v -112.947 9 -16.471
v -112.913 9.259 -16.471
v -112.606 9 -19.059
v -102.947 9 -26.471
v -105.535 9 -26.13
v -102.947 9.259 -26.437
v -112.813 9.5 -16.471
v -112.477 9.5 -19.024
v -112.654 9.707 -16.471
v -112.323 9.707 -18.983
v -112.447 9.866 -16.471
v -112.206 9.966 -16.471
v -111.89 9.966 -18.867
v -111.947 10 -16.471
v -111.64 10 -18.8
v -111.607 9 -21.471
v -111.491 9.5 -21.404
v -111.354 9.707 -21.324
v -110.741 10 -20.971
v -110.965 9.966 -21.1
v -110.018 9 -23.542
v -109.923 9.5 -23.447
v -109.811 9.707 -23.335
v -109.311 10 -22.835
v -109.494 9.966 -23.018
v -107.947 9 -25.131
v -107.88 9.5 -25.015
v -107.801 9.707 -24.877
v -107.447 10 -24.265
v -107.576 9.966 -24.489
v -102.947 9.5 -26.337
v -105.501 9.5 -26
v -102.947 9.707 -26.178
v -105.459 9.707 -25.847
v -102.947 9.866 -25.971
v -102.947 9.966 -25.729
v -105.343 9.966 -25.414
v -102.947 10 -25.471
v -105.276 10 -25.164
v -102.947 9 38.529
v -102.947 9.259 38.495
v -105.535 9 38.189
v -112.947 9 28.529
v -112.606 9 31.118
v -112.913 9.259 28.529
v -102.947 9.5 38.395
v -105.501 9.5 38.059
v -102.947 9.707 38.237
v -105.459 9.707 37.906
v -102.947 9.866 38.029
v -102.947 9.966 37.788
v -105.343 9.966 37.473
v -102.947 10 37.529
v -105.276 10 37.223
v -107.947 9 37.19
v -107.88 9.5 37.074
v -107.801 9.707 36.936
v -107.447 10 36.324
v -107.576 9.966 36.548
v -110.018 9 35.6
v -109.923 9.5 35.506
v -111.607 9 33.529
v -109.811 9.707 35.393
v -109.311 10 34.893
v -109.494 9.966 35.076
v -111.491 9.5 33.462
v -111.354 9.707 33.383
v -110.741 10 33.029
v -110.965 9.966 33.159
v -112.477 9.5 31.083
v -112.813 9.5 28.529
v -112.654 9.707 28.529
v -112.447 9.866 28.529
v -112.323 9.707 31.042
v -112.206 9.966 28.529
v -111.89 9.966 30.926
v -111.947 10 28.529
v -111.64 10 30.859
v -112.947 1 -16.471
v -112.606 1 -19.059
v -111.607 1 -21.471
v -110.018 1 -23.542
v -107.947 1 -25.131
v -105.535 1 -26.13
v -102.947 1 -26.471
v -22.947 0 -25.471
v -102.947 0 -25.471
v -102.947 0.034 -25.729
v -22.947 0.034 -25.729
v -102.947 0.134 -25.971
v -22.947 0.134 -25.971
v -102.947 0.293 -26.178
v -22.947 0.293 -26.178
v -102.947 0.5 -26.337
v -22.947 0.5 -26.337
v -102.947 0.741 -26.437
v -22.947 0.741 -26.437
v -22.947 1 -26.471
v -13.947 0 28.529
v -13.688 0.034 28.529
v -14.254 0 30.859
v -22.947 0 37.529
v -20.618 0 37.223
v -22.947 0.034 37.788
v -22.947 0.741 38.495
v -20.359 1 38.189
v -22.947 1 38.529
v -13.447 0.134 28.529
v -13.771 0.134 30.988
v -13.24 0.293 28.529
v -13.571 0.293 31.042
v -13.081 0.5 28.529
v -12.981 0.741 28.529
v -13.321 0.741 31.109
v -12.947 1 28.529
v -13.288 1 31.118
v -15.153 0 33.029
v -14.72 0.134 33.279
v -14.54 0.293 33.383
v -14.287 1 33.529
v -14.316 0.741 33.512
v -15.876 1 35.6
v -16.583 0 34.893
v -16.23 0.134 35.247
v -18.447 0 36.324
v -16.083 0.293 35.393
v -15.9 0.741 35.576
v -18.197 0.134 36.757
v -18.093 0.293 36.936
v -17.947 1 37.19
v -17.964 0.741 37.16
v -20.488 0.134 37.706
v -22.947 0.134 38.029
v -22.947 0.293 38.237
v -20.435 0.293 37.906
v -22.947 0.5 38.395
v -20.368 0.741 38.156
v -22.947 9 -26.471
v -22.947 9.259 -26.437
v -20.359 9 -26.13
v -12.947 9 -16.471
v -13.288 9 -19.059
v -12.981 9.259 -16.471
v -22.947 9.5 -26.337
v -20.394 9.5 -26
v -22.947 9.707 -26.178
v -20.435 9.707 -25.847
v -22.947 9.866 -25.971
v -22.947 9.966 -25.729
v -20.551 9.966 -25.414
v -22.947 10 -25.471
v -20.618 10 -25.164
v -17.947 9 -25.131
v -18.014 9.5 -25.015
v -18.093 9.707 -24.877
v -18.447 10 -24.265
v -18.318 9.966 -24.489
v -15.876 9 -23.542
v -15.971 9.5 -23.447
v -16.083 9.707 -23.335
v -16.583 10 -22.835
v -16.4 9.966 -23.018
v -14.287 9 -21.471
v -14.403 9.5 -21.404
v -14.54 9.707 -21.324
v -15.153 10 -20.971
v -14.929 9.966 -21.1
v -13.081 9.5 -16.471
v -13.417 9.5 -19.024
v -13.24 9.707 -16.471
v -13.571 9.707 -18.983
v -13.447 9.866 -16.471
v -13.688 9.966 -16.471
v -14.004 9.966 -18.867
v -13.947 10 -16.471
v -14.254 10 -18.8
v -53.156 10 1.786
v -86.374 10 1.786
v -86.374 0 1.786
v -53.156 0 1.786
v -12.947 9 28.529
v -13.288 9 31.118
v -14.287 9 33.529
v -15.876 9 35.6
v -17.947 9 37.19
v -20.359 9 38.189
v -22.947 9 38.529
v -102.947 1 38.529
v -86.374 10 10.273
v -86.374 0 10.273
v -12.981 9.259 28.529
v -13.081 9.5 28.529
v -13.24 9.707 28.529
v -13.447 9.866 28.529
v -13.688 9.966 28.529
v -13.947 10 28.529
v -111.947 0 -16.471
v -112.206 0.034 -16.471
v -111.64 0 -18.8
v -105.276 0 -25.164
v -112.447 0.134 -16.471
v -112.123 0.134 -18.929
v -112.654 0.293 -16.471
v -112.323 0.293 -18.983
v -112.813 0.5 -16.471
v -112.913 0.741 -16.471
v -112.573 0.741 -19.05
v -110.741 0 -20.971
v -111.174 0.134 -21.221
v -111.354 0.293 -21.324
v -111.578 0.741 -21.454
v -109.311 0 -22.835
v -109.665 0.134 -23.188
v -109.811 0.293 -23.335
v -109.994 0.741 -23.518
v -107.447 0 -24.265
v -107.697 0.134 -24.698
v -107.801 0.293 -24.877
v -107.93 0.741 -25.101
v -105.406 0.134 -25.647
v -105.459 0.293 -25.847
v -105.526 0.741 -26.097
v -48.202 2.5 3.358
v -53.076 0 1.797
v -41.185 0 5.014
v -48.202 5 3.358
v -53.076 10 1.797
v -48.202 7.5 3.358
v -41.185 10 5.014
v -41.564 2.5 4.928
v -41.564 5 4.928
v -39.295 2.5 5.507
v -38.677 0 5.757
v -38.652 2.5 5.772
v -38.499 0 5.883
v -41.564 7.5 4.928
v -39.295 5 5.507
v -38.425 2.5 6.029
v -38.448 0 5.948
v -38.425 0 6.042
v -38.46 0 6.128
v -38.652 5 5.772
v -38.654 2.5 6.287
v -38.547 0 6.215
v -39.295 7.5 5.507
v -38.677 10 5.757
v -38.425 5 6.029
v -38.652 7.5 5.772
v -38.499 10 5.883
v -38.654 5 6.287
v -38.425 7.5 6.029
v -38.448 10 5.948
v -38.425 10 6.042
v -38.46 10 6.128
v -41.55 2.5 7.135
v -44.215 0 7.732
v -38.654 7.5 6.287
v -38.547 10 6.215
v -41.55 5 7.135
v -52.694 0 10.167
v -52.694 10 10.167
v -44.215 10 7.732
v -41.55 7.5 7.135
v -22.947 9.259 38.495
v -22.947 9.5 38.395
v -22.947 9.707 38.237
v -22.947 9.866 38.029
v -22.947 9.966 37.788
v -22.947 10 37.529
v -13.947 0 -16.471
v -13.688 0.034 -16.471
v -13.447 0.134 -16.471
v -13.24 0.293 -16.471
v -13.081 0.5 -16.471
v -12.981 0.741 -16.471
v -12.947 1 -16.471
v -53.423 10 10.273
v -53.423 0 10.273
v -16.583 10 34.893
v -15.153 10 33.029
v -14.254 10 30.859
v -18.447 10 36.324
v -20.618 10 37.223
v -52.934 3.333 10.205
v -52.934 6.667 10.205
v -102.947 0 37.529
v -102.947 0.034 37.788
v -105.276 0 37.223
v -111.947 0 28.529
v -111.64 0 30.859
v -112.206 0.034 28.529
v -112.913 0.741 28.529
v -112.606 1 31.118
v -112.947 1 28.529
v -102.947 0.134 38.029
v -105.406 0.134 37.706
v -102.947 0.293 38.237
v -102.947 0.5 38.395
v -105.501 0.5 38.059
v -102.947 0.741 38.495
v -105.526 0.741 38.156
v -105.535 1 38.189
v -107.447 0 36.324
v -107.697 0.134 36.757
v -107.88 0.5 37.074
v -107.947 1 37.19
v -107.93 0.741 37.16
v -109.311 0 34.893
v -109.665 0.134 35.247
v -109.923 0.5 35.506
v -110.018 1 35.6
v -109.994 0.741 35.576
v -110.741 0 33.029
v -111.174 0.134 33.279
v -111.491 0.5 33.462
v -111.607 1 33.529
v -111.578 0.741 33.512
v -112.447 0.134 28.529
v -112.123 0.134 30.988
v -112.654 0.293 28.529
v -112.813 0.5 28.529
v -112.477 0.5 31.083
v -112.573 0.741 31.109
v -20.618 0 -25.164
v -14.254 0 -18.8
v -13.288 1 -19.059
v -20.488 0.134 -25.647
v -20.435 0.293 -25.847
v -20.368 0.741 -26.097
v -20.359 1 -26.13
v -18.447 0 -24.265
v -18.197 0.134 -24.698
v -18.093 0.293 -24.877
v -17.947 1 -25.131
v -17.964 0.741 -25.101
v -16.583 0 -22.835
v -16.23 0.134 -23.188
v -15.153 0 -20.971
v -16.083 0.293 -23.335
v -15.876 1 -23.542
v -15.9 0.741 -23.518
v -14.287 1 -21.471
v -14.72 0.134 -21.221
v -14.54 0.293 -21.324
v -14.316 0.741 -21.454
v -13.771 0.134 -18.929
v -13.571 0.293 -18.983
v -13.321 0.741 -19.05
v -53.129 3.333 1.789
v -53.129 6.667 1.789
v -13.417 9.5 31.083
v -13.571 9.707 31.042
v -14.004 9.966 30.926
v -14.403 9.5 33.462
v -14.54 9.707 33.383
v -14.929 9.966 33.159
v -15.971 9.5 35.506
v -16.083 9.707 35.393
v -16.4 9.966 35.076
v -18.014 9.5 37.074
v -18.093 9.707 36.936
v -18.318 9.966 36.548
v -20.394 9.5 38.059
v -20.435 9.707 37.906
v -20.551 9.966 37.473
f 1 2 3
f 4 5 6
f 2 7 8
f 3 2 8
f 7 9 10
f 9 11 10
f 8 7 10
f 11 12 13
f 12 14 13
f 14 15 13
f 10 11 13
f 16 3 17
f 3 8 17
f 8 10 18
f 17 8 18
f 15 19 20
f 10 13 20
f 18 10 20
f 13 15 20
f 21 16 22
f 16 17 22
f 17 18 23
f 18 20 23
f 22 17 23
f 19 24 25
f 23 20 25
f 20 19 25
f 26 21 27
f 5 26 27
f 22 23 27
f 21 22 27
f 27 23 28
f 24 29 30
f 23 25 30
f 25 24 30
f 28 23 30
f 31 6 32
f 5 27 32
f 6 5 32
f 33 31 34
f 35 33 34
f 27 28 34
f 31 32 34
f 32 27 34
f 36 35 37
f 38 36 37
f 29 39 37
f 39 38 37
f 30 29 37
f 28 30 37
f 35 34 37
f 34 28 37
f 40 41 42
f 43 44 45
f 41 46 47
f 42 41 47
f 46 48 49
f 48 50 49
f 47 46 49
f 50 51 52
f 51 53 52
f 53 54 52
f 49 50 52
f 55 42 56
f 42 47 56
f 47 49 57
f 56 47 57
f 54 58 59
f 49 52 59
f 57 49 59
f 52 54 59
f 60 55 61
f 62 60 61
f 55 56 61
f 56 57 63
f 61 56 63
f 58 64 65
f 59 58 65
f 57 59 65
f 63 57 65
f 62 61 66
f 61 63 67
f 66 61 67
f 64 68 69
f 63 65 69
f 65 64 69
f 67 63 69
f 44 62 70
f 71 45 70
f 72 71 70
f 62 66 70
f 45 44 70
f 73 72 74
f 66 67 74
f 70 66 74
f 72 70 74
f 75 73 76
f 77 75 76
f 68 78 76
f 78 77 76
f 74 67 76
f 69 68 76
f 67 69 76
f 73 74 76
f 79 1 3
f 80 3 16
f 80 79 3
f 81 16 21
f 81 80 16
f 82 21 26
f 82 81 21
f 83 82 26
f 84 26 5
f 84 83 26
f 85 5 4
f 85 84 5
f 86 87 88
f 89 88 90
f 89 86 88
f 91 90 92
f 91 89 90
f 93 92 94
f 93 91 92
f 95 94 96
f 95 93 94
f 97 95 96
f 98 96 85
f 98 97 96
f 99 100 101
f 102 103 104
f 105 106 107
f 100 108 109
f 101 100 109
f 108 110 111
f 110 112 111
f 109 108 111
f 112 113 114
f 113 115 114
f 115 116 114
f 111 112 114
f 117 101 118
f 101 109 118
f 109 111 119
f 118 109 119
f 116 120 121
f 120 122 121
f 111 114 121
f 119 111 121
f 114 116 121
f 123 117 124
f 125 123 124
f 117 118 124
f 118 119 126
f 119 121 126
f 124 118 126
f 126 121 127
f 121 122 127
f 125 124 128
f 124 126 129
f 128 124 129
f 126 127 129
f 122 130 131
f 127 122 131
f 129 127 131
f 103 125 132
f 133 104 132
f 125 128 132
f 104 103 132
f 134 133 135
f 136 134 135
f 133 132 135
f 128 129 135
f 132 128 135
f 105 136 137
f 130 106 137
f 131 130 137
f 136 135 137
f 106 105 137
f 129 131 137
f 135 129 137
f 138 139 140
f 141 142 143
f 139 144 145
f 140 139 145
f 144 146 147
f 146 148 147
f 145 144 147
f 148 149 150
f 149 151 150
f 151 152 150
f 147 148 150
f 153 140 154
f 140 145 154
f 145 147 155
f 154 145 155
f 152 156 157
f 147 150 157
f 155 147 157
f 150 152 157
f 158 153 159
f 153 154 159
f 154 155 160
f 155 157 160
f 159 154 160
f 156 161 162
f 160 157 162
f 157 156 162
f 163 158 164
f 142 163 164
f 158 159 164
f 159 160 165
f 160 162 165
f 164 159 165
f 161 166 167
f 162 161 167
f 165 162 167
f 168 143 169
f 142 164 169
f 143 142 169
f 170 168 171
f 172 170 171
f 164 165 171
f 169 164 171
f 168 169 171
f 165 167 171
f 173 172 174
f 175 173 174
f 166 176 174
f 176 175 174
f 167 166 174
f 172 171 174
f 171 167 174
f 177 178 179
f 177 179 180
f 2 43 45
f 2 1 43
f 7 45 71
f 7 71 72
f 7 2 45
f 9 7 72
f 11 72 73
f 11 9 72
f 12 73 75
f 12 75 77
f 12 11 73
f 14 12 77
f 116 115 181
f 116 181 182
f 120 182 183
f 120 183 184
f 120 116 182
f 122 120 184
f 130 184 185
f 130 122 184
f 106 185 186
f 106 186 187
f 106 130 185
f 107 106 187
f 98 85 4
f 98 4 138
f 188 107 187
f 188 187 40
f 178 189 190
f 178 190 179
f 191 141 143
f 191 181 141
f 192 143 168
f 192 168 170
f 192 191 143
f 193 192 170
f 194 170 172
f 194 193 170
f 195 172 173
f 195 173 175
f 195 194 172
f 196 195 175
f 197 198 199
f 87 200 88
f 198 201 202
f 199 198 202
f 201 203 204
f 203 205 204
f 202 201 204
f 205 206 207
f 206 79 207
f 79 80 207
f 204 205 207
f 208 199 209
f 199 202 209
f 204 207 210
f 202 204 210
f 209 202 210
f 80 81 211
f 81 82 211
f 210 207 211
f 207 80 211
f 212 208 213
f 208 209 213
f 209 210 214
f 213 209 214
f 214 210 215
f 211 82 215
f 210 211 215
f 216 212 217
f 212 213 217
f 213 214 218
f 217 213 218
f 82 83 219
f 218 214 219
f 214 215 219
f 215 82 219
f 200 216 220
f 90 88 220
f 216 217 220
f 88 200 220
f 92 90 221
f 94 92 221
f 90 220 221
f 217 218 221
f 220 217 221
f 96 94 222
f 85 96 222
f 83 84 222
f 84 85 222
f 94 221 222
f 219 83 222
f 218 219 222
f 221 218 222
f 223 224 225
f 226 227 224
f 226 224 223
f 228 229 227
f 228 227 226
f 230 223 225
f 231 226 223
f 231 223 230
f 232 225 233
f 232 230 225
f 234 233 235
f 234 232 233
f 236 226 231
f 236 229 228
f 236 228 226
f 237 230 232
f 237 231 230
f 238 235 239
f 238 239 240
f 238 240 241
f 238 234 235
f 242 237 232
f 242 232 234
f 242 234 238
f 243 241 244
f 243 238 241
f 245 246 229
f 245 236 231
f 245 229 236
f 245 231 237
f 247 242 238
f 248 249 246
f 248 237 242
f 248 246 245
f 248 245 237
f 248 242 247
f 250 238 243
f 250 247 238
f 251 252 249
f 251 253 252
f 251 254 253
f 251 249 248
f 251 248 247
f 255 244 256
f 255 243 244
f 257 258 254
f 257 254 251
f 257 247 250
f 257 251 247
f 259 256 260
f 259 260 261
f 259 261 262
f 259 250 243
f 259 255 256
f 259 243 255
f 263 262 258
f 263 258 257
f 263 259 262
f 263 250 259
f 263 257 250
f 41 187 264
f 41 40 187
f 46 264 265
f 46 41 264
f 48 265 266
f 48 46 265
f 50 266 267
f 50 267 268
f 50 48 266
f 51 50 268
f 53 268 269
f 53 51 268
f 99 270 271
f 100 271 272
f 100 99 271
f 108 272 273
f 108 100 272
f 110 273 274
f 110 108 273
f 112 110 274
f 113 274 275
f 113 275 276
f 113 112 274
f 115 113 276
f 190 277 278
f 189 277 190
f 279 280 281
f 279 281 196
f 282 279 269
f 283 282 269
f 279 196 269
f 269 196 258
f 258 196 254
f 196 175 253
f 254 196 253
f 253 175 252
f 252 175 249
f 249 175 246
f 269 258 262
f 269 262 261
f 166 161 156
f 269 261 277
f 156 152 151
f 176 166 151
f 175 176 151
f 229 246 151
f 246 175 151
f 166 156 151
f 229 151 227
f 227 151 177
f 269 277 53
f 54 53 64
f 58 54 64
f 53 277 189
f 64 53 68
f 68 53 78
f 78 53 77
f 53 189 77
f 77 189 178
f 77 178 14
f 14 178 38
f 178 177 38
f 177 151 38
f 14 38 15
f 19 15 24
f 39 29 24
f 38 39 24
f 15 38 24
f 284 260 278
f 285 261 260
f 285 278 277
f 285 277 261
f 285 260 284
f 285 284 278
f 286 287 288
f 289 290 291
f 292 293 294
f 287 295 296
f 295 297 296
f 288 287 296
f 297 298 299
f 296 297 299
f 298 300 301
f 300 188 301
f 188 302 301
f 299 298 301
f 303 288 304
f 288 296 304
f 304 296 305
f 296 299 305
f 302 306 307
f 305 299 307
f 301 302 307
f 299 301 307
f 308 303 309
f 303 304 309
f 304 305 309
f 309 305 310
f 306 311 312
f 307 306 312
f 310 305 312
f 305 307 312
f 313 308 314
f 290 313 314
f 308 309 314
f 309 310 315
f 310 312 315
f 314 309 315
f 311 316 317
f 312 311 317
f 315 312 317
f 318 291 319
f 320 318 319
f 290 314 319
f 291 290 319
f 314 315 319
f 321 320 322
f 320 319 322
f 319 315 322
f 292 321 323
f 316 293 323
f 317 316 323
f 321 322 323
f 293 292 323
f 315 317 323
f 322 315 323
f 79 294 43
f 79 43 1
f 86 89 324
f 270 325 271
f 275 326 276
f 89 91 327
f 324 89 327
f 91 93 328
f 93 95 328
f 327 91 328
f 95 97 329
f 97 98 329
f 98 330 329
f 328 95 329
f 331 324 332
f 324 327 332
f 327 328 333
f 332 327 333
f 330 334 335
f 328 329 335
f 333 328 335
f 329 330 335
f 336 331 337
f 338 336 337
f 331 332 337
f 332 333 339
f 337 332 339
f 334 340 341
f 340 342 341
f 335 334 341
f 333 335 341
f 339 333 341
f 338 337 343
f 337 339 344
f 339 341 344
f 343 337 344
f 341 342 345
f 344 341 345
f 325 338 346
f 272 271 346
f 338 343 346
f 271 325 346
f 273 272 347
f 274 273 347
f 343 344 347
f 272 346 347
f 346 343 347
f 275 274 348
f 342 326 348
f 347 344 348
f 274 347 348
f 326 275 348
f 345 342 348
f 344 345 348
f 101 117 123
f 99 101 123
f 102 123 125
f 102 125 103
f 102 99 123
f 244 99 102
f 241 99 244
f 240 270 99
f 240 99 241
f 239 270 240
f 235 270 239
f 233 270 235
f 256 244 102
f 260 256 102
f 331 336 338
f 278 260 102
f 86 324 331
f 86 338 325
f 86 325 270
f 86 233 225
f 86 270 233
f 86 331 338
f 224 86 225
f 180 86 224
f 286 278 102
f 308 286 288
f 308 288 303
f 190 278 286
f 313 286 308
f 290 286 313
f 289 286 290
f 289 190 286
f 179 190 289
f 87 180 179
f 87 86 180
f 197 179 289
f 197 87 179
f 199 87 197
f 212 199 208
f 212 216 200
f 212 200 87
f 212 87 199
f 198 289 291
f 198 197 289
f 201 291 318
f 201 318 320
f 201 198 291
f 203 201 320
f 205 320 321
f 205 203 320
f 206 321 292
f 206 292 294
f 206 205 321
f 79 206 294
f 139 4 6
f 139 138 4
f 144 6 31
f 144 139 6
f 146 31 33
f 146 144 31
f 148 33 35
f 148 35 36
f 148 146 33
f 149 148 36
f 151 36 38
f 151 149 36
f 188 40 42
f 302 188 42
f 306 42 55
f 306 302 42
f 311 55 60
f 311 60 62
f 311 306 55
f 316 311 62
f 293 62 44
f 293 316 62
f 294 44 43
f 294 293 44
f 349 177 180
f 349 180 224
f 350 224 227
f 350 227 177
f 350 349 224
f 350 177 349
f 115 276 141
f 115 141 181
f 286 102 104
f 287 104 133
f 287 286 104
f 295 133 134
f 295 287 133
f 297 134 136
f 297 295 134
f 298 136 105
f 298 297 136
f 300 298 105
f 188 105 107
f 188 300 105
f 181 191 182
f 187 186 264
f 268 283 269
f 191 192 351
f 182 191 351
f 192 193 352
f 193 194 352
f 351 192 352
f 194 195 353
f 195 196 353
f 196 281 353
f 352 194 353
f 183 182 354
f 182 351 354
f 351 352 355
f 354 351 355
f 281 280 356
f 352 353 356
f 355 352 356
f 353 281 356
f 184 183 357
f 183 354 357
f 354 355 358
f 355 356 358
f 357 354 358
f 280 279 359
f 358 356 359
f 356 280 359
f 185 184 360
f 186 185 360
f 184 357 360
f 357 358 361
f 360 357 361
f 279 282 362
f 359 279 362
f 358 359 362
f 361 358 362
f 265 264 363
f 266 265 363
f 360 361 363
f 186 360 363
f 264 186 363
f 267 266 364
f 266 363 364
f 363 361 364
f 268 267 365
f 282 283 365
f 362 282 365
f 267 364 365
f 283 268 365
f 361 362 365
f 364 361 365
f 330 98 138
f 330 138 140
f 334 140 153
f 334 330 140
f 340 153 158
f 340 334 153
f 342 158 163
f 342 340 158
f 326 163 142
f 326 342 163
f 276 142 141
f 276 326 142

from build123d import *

# Parameters (mm, degrees)
BOSS_EXTRUDE1_DEPTH = 10
CUT_EXTRUDE2_DEPTH  = 10
FILLET1_R           = 1
FILLET2_R           = 1


with BuildPart() as part:
    # Sketch1 → Boss-Extrude1 (new body)
    with BuildSketch(Plane(origin=(0, 0, 0), x_dir=(1, 0, 0), z_dir=(0, 1, 0))):
        with BuildLine():
            Line((-102.94704138, 26.470588235), (-22.94704138, 26.470588235))
            ThreePointArc((-22.94704138, 26.470588235), (-15.875973568, 23.541656047), (-12.94704138, 16.470588235))
            Line((-12.94704138, 16.470588235), (-12.94704138, -28.529411765))
            ThreePointArc((-12.94704138, -28.529411765), (-15.875973568, -35.600479577), (-22.94704138, -38.529411765))
            Line((-22.94704138, -38.529411765), (-102.94704138, -38.529411765))
            ThreePointArc((-102.94704138, -38.529411765), (-110.018109192, -35.600479577), (-112.94704138, -28.529411765))
            Line((-112.94704138, -28.529411765), (-112.94704138, 16.470588235))
            ThreePointArc((-112.94704138, 16.470588235), (-110.018109192, 23.541656047), (-102.94704138, 26.470588235))
        make_face()
    extrude(amount=BOSS_EXTRUDE1_DEPTH)

    # Sketch2 → Cut-Extrude2 (cut)
    with BuildSketch(Plane(origin=(0, 10, 0), x_dir=(1, 0, 0), z_dir=(0, 1, 0))):
        with BuildLine():
            Line((-86.374151264, -1.785526941), (-53.155911565, -1.785526941))
            add(Edge.make_bspline(
                [(-53.155911565, -1.785526941), (-53.129080982, -1.789380086), (-53.1023159, -1.793281348), (-53.075607342, -1.797231207)],
                knots=[0, 0, 0, 0, 0.0009964, 0.0009964, 0.0009964, 0.0009964], degree=3))
            add(Edge.make_bspline(
                [(-53.075607342, -1.797231207), (-51.541485704, -2.316740326), (-45.415602023, -4.422444293), (-33.321239101, -6.01523888), (-45.249562715, -7.639432102), (-51.251453322, -9.678465504), (-52.693570539, -10.167430322)],
                knots=[0, 0, 0, 0, 0.063344572, 0.23684536, 0.40937521, 0.468351292, 0.468351292, 0.468351292, 0.468351292], degree=3))
            add(Edge.make_bspline(
                [(-52.693570539, -10.167430322), (-52.933080229, -10.206733211), (-53.17537239, -10.242094783), (-53.423139068, -10.273296592)],
                knots=[0.31414383, 0.31414383, 0.31414383, 0.31414383, 0.323514461, 0.323514461, 0.323514461, 0.323514461], degree=3))
            Line((-53.423139068, -10.273296592), (-86.374151264, -10.273296592))
            Line((-86.374151264, -10.273296592), (-86.374151264, -1.785526941))
        make_face()
    extrude(amount=-CUT_EXTRUDE2_DEPTH, mode=Mode.SUBTRACT)

    # Fillet1
    fillet1_edges = [part.edges().sort_by_distance(p)[0] for p in [
        (-110.018109192, 10, -23.541656047),
        (-112.94704138, 10, 6.029411765),
        (-110.018109192, 10, 35.600479577),
        (-62.94704138, 10, 38.529411765),
        (-15.875973568, 10, 35.600479577),
        (-12.94704138, 10, 6.029411765),
        (-15.875973568, 10, -23.541656047),
        (-62.94704138, 10, -26.470588235),
    ]]
    fillet(fillet1_edges, radius=FILLET1_R)

    # Fillet2
    fillet2_edges = [part.edges().sort_by_distance(p)[0] for p in [
        (-112.94704138, 0, 6.029411765),
        (-110.018109192, 0, -23.541656047),
        (-62.94704138, 0, -26.470588235),
        (-15.875973568, 0, -23.541656047),
        (-12.94704138, 0, 6.029411765),
        (-15.875973568, 0, 35.600479577),
        (-62.94704138, 0, 38.529411765),
        (-110.018109192, 0, 35.600479577),
    ]]
    fillet(fillet2_edges, radius=FILLET2_R)


solid = part.part
